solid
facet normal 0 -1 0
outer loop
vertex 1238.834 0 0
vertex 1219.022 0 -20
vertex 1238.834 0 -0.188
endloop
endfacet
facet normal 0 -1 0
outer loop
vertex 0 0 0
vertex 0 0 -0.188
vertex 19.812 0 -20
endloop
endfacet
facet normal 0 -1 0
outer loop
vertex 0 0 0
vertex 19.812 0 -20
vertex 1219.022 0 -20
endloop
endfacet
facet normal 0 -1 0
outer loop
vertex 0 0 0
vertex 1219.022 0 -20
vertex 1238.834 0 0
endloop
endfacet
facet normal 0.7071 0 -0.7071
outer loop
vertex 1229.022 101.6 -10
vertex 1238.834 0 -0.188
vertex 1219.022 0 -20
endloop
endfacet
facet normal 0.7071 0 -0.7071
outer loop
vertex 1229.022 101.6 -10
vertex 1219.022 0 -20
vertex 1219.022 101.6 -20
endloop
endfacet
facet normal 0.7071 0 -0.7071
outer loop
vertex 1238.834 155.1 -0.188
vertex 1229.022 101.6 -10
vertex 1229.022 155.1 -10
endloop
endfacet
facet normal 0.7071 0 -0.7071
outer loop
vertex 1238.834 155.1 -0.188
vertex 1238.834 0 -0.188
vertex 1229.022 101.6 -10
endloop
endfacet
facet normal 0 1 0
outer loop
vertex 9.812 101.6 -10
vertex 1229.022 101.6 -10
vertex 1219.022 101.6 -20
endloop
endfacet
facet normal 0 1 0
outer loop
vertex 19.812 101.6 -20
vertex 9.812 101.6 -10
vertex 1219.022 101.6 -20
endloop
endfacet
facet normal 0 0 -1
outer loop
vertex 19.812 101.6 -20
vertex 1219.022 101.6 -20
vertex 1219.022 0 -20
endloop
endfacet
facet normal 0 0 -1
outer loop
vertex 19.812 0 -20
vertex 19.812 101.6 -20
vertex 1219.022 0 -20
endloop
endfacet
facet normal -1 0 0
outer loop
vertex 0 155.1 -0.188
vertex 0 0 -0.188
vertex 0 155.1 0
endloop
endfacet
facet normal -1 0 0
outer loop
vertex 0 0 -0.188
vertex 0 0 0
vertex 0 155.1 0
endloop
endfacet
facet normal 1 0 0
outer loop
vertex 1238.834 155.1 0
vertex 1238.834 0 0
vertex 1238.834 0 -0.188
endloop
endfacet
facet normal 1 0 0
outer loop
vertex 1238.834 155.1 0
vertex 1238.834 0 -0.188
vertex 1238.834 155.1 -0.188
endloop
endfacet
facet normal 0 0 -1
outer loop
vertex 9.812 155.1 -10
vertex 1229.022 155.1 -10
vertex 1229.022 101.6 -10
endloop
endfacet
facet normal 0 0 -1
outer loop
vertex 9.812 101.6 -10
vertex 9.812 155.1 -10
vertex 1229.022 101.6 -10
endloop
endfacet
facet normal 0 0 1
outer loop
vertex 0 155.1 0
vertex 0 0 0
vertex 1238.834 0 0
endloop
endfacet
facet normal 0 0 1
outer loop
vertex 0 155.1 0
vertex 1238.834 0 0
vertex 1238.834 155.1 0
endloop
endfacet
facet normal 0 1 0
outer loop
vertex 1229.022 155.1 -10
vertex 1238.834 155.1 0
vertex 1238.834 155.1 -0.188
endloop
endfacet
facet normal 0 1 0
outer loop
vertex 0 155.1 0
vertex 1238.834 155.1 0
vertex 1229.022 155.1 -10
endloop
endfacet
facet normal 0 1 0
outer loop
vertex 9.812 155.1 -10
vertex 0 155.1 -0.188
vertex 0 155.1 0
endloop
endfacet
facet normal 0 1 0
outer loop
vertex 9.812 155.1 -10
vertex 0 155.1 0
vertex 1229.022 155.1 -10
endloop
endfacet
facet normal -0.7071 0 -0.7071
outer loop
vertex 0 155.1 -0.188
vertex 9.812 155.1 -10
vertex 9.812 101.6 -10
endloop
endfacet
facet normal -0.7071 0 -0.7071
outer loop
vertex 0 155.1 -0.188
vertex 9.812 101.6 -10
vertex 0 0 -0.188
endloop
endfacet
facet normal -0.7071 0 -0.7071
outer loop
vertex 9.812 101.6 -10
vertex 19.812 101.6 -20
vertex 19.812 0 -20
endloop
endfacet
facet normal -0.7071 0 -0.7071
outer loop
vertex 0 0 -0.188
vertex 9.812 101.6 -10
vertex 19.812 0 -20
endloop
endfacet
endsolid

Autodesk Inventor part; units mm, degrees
ref_plane "YZ Plane" through (0, 0, 0) normal (1, 0, 0) x (0, 1, 0)
ref_plane "XZ Plane" through (0, 0, 0) normal (0, 1, 0) x (-1, 0, 0)
ref_plane "XY Plane" through (0, 0, 0) normal (0, 0, 1) x (1, 0, 0)
sketch "Sketch1" plane through (0, 0, 0) normal (1, 0, 0) x (0, 1, 0)
  line L0 (0, 0) -> (155.1, 0)
  line L1 (155.1, 0) -> (155.1, -10)
  line L2 (0, -20) -> (0, 0)
  line L3 (155.1, -10) -> (101.6, -10)
  line L4 (101.6, -10) -> (101.6, -20)
  line L5 (101.6, -20) -> (0, -20)
  dimension "d3" = 53.5
  dimension "d4" = 155.1
  dimension "d5" = 10
  dimension "d6" = 10
  dimension "d7" = 20
  dimension "d18" = 101.6
extrude "Extrusion1" add sketch "Sketch1" along normal blind 1238.8342
chamfer "Chamfer1" distance 19.812 angle 45 1 edges at (1238.8342, 50.8, -20)
chamfer "Chamfer2" distance 19.812 angle 45 1 edges at (0, 50.8, -20)
properties part number "SkinnySideLength" material "Wood (Birch)"
